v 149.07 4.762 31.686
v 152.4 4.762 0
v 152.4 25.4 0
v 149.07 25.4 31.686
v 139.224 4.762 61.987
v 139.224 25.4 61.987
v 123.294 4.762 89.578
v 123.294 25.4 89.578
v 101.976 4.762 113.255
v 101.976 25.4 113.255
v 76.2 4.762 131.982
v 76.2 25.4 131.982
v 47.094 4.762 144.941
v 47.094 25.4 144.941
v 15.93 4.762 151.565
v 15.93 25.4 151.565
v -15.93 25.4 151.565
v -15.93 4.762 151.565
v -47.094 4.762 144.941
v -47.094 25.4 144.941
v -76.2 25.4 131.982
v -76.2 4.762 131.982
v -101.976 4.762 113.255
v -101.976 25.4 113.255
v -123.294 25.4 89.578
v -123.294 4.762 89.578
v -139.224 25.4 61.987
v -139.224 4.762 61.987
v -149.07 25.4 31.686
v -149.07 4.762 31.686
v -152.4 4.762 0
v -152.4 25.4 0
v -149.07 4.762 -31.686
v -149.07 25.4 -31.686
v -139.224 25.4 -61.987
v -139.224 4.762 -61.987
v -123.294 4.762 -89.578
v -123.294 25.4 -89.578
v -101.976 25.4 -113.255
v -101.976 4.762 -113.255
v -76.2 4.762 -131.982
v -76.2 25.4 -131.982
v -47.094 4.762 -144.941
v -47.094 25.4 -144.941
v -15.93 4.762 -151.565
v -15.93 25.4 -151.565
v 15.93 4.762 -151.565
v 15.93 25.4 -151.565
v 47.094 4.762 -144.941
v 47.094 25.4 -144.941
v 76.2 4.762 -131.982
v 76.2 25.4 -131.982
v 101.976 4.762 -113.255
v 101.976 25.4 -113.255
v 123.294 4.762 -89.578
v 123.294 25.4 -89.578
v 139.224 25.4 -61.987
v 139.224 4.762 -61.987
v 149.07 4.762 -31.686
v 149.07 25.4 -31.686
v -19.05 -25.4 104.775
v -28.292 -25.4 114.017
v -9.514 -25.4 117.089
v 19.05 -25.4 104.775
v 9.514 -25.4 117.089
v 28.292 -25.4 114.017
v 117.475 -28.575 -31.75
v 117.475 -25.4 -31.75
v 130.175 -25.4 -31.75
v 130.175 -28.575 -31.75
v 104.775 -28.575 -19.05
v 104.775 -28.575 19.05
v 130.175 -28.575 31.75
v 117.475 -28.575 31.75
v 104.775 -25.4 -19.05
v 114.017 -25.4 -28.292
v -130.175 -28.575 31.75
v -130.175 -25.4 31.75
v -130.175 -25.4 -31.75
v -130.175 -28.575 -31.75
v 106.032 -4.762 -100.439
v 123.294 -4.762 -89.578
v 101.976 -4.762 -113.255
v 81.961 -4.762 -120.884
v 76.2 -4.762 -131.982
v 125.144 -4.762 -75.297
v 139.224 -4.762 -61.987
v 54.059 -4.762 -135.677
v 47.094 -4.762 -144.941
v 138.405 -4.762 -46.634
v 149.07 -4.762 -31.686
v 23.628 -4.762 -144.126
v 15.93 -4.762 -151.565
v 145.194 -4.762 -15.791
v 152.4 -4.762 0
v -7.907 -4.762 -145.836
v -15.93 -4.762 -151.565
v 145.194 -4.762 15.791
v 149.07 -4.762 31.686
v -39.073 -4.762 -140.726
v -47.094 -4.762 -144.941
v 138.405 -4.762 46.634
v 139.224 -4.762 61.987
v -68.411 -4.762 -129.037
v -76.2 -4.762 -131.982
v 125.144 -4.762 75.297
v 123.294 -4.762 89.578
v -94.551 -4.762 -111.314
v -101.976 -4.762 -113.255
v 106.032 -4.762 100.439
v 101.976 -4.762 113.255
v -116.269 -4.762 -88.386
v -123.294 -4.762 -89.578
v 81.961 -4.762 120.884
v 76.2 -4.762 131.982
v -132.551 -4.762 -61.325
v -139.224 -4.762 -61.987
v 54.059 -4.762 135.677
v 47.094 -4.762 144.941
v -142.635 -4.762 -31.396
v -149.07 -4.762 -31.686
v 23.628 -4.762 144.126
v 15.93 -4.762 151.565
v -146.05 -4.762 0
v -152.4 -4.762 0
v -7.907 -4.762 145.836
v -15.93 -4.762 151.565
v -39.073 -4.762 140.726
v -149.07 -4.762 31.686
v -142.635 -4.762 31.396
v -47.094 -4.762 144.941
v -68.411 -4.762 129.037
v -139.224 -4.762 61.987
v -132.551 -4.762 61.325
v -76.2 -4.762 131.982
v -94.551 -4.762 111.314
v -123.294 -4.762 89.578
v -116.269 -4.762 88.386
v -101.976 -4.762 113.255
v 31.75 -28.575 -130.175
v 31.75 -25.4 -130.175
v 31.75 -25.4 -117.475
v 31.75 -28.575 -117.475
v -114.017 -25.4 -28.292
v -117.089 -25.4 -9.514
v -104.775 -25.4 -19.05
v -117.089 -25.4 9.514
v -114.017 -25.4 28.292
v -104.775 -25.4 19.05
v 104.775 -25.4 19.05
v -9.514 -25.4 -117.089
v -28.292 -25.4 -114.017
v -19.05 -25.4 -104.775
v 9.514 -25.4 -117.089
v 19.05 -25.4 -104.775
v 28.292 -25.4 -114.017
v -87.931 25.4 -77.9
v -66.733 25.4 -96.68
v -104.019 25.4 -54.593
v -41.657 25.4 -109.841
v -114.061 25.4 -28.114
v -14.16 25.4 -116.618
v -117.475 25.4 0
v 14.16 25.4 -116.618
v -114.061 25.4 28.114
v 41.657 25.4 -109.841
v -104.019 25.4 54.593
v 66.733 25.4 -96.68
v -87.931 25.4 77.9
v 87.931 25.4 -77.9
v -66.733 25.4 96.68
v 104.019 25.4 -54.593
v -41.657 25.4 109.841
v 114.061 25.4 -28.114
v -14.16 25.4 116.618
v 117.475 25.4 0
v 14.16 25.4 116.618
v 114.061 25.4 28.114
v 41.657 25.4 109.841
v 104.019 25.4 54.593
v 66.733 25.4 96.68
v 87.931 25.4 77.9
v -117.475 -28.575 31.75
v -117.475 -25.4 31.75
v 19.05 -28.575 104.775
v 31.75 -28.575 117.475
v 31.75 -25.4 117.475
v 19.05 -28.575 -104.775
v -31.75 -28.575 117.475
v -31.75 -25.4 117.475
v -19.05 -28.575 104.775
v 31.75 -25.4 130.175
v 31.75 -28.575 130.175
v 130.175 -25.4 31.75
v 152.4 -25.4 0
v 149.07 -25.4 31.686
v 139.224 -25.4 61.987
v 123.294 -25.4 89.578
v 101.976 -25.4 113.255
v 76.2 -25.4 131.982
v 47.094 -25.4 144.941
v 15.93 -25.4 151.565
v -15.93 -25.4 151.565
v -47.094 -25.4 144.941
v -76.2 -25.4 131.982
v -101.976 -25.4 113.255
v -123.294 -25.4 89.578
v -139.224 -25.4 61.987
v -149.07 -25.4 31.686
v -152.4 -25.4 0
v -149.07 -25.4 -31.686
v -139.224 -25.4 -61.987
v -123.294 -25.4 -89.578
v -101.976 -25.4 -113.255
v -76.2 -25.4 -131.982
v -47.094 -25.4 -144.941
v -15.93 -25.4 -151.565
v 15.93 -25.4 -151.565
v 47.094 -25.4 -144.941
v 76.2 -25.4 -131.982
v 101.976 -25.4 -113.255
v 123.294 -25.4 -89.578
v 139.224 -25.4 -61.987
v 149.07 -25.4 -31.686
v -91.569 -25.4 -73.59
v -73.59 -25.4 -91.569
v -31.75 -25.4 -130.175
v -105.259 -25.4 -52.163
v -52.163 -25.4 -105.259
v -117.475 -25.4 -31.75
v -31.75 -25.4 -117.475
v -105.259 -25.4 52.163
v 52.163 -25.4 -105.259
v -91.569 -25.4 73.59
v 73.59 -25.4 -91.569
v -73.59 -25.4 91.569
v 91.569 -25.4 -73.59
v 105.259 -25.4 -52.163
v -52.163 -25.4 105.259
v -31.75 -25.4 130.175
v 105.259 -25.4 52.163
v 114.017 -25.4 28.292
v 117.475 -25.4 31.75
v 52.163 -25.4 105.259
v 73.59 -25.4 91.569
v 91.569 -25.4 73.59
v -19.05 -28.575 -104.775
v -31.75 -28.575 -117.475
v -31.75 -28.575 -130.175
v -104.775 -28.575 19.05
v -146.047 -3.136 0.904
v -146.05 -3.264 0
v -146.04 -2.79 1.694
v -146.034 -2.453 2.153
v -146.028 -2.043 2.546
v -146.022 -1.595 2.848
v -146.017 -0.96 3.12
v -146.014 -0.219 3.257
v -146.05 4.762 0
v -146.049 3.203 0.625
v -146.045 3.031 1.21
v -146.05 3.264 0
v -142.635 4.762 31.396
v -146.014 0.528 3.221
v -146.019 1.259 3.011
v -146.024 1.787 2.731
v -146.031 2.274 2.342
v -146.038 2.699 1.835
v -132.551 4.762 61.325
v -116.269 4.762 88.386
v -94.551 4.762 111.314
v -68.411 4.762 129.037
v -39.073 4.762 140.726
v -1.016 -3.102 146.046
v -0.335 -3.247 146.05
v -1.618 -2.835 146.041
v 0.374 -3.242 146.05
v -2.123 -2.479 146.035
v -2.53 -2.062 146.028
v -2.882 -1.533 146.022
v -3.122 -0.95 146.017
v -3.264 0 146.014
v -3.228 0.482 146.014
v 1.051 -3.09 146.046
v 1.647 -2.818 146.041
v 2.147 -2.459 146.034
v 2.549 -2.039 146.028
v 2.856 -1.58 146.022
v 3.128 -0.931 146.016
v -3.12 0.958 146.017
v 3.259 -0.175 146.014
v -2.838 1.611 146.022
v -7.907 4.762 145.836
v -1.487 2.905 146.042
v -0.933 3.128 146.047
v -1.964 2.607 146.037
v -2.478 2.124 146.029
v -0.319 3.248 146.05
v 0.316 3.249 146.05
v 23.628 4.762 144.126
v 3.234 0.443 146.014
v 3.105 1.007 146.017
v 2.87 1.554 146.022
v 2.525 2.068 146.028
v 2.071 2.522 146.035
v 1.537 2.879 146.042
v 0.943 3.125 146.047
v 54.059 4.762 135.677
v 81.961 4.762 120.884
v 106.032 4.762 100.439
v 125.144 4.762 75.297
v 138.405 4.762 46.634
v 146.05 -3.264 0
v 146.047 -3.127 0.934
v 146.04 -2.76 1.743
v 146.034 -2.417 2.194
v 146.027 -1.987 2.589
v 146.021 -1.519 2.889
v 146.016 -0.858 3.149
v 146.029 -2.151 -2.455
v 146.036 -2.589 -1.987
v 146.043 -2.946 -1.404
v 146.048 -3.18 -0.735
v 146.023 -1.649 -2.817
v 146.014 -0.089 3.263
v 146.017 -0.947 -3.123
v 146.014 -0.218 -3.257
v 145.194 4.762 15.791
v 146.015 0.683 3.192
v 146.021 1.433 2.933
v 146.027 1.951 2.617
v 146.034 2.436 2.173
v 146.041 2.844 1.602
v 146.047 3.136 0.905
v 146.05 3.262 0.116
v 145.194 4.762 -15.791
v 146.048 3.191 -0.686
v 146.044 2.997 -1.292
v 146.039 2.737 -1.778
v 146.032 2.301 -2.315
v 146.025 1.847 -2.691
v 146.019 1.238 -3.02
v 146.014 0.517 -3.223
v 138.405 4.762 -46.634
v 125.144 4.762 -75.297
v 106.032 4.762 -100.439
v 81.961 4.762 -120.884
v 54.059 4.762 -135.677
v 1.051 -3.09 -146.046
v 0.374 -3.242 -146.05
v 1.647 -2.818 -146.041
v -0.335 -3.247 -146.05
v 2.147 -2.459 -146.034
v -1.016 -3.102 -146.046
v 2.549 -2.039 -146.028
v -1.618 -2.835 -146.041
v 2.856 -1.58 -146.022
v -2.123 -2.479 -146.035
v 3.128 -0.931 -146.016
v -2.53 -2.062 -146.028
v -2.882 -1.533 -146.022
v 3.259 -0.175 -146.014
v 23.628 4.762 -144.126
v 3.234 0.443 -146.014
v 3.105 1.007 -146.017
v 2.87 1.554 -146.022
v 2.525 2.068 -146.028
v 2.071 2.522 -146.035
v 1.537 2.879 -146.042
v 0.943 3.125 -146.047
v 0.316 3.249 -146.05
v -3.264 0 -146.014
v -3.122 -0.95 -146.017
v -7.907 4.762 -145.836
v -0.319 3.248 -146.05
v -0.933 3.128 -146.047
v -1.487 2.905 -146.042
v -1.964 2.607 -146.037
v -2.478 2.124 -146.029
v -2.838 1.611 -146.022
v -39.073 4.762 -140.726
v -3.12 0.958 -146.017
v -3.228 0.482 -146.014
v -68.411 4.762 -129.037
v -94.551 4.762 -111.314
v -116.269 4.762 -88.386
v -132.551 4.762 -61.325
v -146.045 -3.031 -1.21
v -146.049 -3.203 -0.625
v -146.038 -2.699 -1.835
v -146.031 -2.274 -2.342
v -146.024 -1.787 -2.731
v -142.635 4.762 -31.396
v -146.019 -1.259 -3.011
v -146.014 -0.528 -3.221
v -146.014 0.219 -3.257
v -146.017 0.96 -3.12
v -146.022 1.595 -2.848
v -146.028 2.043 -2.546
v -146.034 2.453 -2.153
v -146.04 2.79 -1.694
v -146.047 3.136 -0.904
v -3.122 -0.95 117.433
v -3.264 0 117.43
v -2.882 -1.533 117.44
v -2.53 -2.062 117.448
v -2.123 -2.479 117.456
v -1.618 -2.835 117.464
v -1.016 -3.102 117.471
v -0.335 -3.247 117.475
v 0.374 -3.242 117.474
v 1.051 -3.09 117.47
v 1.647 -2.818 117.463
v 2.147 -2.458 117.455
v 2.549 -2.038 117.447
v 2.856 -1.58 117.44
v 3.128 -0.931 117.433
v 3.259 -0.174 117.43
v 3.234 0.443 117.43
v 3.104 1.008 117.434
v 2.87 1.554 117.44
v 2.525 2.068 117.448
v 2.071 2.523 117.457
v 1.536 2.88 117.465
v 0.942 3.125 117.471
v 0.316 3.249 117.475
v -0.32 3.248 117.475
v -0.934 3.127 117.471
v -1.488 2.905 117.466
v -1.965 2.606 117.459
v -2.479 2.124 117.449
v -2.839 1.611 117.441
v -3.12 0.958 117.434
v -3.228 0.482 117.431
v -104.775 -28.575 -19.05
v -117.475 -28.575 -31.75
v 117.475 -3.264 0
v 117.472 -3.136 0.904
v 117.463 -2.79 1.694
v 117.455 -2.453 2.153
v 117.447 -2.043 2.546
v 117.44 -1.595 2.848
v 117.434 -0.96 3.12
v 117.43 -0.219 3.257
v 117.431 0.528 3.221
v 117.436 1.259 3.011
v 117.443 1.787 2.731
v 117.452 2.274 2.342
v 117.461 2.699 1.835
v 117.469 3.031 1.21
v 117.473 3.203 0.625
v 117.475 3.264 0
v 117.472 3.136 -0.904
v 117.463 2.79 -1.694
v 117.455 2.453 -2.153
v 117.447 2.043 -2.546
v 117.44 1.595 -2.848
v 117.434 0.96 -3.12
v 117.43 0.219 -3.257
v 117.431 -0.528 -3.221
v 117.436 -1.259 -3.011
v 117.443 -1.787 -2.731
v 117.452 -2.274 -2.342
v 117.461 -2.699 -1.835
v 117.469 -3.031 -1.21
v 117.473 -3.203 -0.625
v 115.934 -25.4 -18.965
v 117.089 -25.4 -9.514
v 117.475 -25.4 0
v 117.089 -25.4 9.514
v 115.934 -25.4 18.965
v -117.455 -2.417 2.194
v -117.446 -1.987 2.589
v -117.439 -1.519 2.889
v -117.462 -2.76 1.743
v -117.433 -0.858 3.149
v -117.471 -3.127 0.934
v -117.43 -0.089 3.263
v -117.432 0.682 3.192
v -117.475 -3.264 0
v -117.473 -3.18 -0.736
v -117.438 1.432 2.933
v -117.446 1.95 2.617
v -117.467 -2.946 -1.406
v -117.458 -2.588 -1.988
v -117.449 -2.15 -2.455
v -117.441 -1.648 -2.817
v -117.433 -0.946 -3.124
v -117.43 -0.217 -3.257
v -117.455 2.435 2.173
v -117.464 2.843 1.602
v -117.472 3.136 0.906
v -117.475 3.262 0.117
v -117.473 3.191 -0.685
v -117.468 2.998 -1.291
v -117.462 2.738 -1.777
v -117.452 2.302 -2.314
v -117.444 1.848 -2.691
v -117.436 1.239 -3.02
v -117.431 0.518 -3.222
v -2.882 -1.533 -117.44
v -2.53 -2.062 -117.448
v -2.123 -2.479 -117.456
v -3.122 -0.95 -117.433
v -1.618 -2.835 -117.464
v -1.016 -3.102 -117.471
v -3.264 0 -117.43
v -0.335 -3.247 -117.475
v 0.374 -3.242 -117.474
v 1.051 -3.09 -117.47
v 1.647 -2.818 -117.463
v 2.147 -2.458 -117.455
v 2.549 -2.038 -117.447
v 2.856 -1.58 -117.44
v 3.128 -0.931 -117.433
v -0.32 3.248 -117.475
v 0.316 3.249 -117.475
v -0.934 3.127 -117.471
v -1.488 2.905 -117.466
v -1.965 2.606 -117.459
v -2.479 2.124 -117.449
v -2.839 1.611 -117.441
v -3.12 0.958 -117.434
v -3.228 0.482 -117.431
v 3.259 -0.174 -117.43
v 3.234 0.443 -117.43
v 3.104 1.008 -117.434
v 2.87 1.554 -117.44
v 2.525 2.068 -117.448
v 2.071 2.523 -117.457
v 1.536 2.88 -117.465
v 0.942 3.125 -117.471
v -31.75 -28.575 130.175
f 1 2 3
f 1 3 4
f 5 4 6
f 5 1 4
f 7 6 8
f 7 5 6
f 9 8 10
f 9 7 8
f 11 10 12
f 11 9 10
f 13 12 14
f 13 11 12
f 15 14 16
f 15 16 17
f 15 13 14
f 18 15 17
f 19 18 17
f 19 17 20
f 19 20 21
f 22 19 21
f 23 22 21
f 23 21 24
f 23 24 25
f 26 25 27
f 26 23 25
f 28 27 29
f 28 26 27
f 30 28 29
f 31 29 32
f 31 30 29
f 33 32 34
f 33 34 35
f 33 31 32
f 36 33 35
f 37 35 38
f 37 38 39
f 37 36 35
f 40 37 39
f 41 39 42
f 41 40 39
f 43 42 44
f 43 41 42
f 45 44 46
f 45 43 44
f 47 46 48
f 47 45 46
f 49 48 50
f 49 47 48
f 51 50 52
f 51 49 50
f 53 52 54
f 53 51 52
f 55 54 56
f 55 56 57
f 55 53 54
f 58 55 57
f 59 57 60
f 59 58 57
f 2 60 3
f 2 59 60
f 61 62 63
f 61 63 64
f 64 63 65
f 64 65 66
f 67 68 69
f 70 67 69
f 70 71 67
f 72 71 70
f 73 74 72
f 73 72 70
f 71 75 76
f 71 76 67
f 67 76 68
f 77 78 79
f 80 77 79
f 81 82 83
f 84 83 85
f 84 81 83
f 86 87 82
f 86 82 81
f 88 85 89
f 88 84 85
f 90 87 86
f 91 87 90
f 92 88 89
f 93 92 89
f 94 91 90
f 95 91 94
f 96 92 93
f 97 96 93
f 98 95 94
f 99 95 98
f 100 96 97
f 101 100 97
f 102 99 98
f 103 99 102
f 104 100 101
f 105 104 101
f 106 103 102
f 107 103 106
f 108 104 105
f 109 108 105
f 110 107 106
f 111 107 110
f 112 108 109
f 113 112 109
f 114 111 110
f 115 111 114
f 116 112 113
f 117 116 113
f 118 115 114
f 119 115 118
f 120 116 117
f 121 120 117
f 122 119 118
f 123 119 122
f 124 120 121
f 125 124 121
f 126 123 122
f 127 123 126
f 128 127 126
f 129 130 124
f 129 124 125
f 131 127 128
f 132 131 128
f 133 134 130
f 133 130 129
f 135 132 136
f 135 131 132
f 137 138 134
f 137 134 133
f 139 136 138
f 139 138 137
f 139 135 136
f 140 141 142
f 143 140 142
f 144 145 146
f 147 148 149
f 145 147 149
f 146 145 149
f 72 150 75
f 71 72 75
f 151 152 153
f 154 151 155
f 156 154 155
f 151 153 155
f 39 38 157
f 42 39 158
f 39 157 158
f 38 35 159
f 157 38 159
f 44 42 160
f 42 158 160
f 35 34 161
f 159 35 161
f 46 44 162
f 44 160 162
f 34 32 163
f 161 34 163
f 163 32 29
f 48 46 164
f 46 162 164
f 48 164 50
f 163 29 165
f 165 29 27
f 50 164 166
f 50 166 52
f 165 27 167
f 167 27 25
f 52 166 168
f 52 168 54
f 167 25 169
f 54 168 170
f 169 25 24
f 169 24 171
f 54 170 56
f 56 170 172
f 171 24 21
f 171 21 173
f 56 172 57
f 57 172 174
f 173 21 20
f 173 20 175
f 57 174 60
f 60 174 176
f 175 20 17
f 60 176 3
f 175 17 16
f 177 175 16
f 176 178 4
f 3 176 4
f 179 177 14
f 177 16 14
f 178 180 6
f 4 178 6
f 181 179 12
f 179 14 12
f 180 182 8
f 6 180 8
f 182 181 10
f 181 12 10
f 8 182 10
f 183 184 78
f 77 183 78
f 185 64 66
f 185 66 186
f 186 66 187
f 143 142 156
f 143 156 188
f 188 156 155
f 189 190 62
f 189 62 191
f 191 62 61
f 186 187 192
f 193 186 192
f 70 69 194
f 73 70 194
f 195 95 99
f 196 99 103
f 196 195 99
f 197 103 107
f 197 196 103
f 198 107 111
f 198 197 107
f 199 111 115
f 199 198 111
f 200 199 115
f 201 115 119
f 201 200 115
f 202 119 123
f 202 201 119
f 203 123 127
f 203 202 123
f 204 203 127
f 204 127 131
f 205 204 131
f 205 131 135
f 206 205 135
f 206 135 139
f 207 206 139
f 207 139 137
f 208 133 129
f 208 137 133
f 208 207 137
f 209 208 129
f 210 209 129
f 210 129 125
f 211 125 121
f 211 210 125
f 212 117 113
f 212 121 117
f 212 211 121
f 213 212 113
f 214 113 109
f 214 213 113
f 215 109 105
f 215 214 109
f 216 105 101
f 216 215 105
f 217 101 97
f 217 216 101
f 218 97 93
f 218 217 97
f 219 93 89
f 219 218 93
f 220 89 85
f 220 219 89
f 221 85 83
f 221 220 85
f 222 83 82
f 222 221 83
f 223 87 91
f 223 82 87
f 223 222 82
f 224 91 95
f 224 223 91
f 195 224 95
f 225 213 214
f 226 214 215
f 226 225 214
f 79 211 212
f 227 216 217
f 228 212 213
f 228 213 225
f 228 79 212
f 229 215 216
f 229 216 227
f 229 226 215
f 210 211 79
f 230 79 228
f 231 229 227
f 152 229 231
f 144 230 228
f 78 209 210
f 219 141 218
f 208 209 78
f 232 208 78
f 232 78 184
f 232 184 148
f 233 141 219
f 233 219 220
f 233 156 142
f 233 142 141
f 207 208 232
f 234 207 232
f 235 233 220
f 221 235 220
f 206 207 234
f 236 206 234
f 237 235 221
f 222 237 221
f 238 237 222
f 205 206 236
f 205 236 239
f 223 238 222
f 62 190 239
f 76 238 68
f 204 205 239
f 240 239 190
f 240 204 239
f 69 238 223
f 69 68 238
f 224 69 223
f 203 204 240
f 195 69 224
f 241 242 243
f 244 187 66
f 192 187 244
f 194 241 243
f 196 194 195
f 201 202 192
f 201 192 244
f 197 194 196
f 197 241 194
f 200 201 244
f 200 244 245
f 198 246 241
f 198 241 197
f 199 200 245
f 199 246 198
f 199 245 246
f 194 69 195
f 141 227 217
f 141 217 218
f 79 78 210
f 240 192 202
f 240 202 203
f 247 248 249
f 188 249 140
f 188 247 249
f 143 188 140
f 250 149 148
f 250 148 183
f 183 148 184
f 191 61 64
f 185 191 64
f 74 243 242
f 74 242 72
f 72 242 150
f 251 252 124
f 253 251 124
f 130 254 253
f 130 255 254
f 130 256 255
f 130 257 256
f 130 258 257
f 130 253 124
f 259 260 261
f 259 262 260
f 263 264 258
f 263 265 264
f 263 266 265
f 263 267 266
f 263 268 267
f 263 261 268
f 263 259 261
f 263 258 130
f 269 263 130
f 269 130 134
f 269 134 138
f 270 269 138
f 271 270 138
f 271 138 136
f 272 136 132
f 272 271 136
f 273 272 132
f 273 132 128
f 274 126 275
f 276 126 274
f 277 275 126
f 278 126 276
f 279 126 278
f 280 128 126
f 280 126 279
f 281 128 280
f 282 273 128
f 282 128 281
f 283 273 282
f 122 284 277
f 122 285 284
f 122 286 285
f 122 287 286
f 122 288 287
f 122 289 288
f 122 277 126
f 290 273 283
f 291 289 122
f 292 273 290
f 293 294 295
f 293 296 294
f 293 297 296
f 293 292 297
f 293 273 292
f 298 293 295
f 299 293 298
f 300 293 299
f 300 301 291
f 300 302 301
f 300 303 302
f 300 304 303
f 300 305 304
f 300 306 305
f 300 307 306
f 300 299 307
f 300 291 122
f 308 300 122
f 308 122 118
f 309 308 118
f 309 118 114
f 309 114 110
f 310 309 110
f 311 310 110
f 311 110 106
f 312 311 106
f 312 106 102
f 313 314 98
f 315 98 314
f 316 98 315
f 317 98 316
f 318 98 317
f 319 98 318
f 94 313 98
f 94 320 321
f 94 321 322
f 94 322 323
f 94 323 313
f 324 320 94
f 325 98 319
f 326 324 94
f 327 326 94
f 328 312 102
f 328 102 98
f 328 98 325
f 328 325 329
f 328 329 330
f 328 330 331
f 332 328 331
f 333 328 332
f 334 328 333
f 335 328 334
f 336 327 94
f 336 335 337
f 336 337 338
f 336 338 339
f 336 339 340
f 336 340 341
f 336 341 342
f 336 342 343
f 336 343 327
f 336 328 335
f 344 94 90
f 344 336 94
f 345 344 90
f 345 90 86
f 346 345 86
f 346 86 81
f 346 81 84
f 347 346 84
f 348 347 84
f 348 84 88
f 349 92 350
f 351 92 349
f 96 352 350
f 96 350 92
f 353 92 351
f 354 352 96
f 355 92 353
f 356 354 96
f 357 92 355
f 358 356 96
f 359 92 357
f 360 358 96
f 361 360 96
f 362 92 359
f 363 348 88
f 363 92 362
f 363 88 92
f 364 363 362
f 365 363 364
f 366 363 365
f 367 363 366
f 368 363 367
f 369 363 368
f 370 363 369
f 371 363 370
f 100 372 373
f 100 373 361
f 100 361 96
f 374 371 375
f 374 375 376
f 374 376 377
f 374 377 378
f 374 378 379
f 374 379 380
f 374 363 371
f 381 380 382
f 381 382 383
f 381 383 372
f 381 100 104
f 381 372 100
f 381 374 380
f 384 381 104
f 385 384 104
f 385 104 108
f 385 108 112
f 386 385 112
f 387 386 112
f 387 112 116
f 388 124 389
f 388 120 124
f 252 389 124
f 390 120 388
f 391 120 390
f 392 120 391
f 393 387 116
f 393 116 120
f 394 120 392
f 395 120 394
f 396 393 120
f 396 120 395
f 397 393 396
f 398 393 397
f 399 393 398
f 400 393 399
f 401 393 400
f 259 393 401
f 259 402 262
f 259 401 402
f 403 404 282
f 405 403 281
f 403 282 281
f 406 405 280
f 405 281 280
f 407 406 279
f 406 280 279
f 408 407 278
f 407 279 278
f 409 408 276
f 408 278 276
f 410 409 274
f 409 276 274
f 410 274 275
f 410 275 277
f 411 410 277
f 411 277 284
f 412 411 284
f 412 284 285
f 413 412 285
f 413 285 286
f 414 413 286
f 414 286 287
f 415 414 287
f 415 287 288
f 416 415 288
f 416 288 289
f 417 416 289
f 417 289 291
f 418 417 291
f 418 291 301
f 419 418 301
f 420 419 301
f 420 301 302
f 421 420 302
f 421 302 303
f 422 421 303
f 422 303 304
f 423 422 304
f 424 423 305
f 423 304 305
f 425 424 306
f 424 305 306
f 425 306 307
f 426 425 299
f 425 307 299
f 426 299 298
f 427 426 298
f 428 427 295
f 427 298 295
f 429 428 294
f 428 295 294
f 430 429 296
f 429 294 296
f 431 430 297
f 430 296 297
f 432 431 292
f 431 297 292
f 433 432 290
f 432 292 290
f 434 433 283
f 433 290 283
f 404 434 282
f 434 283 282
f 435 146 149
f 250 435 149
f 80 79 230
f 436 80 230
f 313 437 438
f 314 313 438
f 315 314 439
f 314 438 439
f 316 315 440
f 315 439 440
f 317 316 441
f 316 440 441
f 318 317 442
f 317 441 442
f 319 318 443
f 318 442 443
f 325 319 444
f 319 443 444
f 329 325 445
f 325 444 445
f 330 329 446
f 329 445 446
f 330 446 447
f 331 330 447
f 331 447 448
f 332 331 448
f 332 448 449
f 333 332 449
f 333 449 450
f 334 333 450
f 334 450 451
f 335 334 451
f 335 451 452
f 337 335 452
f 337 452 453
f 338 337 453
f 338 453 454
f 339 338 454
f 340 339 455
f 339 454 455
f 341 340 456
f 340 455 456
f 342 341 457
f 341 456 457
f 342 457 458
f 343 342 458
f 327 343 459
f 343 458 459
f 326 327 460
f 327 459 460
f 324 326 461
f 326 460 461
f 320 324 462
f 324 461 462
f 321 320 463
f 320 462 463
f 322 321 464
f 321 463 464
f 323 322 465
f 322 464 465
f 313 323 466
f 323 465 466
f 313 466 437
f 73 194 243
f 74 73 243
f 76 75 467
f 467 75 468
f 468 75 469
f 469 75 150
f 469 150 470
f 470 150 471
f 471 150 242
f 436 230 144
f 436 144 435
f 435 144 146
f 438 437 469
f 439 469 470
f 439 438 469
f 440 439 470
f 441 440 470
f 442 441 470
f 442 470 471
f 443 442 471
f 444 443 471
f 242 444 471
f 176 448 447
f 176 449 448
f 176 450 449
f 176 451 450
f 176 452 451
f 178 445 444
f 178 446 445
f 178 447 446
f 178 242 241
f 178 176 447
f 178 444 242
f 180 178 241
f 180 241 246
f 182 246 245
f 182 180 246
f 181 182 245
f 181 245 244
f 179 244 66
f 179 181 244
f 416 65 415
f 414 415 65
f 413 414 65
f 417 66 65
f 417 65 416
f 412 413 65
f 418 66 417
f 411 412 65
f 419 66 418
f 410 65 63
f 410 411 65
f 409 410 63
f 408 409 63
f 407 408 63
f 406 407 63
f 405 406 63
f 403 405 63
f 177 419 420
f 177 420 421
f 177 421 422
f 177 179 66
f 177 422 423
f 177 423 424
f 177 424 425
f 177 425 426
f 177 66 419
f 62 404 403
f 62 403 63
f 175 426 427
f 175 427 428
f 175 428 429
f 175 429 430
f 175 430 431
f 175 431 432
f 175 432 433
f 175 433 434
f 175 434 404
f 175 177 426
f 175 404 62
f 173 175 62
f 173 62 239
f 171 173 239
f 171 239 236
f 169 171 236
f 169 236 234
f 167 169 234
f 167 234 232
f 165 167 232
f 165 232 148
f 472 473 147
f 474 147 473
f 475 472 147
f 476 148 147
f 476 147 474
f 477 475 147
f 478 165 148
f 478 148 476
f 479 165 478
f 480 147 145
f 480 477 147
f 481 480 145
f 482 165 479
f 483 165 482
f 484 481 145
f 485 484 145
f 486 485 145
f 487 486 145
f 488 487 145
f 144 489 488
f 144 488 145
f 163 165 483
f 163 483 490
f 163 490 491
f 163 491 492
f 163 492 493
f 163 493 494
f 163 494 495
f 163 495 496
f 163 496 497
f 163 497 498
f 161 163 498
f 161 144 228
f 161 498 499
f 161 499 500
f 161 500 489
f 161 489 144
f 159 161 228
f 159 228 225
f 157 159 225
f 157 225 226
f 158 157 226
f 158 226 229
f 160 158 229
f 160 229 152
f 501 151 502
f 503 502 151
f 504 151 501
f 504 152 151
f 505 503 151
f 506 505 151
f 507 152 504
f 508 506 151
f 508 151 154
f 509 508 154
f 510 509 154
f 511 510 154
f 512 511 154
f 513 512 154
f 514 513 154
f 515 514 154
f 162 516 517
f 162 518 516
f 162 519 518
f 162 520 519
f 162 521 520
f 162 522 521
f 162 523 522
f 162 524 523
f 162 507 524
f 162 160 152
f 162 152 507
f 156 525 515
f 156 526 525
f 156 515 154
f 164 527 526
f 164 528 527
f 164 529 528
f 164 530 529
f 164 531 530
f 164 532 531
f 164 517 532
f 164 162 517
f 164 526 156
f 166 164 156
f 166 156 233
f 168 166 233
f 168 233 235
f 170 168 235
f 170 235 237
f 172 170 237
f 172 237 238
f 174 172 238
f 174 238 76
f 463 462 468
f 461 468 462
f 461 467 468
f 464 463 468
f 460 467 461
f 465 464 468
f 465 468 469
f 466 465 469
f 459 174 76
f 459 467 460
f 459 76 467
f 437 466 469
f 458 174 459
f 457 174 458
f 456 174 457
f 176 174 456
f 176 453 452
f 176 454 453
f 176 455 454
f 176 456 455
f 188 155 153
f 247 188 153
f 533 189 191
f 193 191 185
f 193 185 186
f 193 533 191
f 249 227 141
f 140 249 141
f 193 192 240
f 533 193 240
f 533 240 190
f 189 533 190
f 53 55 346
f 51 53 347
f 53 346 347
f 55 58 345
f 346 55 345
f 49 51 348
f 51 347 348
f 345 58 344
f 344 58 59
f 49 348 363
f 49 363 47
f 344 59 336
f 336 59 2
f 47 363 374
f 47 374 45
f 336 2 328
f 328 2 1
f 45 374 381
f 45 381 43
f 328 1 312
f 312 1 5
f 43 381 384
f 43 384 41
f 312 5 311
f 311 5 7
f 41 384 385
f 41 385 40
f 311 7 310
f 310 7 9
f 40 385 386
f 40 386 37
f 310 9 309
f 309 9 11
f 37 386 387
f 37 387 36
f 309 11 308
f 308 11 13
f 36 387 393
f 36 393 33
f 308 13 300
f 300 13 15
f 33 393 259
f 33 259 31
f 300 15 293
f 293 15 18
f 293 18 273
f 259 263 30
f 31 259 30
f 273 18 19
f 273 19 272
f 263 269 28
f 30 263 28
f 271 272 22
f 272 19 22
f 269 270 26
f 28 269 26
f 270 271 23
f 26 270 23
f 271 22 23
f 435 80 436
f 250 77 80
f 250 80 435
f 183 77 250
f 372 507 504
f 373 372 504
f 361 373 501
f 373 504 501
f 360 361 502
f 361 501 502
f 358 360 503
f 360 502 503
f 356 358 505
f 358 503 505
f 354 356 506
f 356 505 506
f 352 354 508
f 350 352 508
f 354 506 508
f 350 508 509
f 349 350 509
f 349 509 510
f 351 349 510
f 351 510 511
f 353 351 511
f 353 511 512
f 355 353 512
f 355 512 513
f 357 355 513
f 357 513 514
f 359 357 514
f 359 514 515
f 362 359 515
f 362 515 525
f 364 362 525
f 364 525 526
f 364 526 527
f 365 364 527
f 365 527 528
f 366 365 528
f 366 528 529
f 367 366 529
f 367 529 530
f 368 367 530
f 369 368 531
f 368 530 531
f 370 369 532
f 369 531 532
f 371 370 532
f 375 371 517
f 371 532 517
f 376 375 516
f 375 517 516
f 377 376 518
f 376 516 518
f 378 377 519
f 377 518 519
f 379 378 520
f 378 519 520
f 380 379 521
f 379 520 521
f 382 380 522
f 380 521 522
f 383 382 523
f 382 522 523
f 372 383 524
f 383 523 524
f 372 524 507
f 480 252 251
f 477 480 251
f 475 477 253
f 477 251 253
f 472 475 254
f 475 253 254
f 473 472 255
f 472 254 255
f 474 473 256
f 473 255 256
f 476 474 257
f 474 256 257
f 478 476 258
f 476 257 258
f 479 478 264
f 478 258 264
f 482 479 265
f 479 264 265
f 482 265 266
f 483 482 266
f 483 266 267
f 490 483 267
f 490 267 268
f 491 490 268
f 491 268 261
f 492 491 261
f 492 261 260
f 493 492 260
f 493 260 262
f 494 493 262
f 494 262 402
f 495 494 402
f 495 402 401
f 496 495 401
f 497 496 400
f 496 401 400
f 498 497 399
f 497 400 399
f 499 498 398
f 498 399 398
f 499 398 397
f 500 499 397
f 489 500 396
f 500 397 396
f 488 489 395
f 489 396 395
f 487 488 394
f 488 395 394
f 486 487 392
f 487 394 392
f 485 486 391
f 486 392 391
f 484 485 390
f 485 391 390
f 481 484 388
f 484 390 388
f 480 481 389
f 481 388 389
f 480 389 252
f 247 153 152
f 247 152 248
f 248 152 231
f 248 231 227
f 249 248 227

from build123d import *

# Parameters (mm, degrees)
F0_R      = 152.4
F0_R_2    = 117.475
F1_DEPTH  = 25.4
F2_W      = 6.35
F2_H      = 9.525
F6_D      = 6.5278
F9_D      = 6.5278
F11_DEPTH = 3.175


with BuildPart() as f1:
    # F0 (on Front) → F1 (new body, symmetric)
    with BuildSketch(Plane.XZ):
        Circle(F0_R)
        Circle(F0_R_2, mode=Mode.SUBTRACT)
    extrude(amount=F1_DEPTH, both=True)

    # F2 (on Top) → F3 (revolve, cut)
    with BuildSketch(Plane.XY):
        with Locations((-149.225, 0)):
            Rectangle(F2_W, F2_H)
    revolve(axis=Axis((0, -5.8908760548, 0), (0, 1, 0)), mode=Mode.SUBTRACT)

    # F6 (through all)
    with Locations(Plane(origin=(0, 0, -152.4), x_dir=(1, 0, 0), z_dir=(0, 0, -1))):
        with Locations((0, 0)):
            Hole(F6_D / 2)

    # F9 (through all)
    with Locations(Plane.YZ.offset(152.4)):
        with Locations((0, 0)):
            Hole(F9_D / 2)

    # F10 (on face) → F11 (join)
    with BuildSketch(Plane.XZ.offset(25.4)):
        Polygon((31.75, 130.175), (-31.75, 130.175), (-31.75, 117.475), (-19.05, 104.775), (19.05, 104.775), (31.75, 117.475), align=None)
        Polygon((-130.175, 31.75), (-130.175, -31.75), (-117.475, -31.75), (-104.775, -19.05), (-104.775, 19.05), (-117.475, 31.75), align=None)
        Polygon((-31.75, -130.175), (31.75, -130.175), (31.75, -117.475), (19.05, -104.775), (-19.05, -104.775), (-31.75, -117.475), align=None)
        Polygon((130.175, -31.75), (130.175, 31.75), (117.475, 31.75), (104.775, 19.05), (104.775, -19.05), (117.475, -31.75), align=None)
    extrude(amount=F11_DEPTH)


solid = f1.part
